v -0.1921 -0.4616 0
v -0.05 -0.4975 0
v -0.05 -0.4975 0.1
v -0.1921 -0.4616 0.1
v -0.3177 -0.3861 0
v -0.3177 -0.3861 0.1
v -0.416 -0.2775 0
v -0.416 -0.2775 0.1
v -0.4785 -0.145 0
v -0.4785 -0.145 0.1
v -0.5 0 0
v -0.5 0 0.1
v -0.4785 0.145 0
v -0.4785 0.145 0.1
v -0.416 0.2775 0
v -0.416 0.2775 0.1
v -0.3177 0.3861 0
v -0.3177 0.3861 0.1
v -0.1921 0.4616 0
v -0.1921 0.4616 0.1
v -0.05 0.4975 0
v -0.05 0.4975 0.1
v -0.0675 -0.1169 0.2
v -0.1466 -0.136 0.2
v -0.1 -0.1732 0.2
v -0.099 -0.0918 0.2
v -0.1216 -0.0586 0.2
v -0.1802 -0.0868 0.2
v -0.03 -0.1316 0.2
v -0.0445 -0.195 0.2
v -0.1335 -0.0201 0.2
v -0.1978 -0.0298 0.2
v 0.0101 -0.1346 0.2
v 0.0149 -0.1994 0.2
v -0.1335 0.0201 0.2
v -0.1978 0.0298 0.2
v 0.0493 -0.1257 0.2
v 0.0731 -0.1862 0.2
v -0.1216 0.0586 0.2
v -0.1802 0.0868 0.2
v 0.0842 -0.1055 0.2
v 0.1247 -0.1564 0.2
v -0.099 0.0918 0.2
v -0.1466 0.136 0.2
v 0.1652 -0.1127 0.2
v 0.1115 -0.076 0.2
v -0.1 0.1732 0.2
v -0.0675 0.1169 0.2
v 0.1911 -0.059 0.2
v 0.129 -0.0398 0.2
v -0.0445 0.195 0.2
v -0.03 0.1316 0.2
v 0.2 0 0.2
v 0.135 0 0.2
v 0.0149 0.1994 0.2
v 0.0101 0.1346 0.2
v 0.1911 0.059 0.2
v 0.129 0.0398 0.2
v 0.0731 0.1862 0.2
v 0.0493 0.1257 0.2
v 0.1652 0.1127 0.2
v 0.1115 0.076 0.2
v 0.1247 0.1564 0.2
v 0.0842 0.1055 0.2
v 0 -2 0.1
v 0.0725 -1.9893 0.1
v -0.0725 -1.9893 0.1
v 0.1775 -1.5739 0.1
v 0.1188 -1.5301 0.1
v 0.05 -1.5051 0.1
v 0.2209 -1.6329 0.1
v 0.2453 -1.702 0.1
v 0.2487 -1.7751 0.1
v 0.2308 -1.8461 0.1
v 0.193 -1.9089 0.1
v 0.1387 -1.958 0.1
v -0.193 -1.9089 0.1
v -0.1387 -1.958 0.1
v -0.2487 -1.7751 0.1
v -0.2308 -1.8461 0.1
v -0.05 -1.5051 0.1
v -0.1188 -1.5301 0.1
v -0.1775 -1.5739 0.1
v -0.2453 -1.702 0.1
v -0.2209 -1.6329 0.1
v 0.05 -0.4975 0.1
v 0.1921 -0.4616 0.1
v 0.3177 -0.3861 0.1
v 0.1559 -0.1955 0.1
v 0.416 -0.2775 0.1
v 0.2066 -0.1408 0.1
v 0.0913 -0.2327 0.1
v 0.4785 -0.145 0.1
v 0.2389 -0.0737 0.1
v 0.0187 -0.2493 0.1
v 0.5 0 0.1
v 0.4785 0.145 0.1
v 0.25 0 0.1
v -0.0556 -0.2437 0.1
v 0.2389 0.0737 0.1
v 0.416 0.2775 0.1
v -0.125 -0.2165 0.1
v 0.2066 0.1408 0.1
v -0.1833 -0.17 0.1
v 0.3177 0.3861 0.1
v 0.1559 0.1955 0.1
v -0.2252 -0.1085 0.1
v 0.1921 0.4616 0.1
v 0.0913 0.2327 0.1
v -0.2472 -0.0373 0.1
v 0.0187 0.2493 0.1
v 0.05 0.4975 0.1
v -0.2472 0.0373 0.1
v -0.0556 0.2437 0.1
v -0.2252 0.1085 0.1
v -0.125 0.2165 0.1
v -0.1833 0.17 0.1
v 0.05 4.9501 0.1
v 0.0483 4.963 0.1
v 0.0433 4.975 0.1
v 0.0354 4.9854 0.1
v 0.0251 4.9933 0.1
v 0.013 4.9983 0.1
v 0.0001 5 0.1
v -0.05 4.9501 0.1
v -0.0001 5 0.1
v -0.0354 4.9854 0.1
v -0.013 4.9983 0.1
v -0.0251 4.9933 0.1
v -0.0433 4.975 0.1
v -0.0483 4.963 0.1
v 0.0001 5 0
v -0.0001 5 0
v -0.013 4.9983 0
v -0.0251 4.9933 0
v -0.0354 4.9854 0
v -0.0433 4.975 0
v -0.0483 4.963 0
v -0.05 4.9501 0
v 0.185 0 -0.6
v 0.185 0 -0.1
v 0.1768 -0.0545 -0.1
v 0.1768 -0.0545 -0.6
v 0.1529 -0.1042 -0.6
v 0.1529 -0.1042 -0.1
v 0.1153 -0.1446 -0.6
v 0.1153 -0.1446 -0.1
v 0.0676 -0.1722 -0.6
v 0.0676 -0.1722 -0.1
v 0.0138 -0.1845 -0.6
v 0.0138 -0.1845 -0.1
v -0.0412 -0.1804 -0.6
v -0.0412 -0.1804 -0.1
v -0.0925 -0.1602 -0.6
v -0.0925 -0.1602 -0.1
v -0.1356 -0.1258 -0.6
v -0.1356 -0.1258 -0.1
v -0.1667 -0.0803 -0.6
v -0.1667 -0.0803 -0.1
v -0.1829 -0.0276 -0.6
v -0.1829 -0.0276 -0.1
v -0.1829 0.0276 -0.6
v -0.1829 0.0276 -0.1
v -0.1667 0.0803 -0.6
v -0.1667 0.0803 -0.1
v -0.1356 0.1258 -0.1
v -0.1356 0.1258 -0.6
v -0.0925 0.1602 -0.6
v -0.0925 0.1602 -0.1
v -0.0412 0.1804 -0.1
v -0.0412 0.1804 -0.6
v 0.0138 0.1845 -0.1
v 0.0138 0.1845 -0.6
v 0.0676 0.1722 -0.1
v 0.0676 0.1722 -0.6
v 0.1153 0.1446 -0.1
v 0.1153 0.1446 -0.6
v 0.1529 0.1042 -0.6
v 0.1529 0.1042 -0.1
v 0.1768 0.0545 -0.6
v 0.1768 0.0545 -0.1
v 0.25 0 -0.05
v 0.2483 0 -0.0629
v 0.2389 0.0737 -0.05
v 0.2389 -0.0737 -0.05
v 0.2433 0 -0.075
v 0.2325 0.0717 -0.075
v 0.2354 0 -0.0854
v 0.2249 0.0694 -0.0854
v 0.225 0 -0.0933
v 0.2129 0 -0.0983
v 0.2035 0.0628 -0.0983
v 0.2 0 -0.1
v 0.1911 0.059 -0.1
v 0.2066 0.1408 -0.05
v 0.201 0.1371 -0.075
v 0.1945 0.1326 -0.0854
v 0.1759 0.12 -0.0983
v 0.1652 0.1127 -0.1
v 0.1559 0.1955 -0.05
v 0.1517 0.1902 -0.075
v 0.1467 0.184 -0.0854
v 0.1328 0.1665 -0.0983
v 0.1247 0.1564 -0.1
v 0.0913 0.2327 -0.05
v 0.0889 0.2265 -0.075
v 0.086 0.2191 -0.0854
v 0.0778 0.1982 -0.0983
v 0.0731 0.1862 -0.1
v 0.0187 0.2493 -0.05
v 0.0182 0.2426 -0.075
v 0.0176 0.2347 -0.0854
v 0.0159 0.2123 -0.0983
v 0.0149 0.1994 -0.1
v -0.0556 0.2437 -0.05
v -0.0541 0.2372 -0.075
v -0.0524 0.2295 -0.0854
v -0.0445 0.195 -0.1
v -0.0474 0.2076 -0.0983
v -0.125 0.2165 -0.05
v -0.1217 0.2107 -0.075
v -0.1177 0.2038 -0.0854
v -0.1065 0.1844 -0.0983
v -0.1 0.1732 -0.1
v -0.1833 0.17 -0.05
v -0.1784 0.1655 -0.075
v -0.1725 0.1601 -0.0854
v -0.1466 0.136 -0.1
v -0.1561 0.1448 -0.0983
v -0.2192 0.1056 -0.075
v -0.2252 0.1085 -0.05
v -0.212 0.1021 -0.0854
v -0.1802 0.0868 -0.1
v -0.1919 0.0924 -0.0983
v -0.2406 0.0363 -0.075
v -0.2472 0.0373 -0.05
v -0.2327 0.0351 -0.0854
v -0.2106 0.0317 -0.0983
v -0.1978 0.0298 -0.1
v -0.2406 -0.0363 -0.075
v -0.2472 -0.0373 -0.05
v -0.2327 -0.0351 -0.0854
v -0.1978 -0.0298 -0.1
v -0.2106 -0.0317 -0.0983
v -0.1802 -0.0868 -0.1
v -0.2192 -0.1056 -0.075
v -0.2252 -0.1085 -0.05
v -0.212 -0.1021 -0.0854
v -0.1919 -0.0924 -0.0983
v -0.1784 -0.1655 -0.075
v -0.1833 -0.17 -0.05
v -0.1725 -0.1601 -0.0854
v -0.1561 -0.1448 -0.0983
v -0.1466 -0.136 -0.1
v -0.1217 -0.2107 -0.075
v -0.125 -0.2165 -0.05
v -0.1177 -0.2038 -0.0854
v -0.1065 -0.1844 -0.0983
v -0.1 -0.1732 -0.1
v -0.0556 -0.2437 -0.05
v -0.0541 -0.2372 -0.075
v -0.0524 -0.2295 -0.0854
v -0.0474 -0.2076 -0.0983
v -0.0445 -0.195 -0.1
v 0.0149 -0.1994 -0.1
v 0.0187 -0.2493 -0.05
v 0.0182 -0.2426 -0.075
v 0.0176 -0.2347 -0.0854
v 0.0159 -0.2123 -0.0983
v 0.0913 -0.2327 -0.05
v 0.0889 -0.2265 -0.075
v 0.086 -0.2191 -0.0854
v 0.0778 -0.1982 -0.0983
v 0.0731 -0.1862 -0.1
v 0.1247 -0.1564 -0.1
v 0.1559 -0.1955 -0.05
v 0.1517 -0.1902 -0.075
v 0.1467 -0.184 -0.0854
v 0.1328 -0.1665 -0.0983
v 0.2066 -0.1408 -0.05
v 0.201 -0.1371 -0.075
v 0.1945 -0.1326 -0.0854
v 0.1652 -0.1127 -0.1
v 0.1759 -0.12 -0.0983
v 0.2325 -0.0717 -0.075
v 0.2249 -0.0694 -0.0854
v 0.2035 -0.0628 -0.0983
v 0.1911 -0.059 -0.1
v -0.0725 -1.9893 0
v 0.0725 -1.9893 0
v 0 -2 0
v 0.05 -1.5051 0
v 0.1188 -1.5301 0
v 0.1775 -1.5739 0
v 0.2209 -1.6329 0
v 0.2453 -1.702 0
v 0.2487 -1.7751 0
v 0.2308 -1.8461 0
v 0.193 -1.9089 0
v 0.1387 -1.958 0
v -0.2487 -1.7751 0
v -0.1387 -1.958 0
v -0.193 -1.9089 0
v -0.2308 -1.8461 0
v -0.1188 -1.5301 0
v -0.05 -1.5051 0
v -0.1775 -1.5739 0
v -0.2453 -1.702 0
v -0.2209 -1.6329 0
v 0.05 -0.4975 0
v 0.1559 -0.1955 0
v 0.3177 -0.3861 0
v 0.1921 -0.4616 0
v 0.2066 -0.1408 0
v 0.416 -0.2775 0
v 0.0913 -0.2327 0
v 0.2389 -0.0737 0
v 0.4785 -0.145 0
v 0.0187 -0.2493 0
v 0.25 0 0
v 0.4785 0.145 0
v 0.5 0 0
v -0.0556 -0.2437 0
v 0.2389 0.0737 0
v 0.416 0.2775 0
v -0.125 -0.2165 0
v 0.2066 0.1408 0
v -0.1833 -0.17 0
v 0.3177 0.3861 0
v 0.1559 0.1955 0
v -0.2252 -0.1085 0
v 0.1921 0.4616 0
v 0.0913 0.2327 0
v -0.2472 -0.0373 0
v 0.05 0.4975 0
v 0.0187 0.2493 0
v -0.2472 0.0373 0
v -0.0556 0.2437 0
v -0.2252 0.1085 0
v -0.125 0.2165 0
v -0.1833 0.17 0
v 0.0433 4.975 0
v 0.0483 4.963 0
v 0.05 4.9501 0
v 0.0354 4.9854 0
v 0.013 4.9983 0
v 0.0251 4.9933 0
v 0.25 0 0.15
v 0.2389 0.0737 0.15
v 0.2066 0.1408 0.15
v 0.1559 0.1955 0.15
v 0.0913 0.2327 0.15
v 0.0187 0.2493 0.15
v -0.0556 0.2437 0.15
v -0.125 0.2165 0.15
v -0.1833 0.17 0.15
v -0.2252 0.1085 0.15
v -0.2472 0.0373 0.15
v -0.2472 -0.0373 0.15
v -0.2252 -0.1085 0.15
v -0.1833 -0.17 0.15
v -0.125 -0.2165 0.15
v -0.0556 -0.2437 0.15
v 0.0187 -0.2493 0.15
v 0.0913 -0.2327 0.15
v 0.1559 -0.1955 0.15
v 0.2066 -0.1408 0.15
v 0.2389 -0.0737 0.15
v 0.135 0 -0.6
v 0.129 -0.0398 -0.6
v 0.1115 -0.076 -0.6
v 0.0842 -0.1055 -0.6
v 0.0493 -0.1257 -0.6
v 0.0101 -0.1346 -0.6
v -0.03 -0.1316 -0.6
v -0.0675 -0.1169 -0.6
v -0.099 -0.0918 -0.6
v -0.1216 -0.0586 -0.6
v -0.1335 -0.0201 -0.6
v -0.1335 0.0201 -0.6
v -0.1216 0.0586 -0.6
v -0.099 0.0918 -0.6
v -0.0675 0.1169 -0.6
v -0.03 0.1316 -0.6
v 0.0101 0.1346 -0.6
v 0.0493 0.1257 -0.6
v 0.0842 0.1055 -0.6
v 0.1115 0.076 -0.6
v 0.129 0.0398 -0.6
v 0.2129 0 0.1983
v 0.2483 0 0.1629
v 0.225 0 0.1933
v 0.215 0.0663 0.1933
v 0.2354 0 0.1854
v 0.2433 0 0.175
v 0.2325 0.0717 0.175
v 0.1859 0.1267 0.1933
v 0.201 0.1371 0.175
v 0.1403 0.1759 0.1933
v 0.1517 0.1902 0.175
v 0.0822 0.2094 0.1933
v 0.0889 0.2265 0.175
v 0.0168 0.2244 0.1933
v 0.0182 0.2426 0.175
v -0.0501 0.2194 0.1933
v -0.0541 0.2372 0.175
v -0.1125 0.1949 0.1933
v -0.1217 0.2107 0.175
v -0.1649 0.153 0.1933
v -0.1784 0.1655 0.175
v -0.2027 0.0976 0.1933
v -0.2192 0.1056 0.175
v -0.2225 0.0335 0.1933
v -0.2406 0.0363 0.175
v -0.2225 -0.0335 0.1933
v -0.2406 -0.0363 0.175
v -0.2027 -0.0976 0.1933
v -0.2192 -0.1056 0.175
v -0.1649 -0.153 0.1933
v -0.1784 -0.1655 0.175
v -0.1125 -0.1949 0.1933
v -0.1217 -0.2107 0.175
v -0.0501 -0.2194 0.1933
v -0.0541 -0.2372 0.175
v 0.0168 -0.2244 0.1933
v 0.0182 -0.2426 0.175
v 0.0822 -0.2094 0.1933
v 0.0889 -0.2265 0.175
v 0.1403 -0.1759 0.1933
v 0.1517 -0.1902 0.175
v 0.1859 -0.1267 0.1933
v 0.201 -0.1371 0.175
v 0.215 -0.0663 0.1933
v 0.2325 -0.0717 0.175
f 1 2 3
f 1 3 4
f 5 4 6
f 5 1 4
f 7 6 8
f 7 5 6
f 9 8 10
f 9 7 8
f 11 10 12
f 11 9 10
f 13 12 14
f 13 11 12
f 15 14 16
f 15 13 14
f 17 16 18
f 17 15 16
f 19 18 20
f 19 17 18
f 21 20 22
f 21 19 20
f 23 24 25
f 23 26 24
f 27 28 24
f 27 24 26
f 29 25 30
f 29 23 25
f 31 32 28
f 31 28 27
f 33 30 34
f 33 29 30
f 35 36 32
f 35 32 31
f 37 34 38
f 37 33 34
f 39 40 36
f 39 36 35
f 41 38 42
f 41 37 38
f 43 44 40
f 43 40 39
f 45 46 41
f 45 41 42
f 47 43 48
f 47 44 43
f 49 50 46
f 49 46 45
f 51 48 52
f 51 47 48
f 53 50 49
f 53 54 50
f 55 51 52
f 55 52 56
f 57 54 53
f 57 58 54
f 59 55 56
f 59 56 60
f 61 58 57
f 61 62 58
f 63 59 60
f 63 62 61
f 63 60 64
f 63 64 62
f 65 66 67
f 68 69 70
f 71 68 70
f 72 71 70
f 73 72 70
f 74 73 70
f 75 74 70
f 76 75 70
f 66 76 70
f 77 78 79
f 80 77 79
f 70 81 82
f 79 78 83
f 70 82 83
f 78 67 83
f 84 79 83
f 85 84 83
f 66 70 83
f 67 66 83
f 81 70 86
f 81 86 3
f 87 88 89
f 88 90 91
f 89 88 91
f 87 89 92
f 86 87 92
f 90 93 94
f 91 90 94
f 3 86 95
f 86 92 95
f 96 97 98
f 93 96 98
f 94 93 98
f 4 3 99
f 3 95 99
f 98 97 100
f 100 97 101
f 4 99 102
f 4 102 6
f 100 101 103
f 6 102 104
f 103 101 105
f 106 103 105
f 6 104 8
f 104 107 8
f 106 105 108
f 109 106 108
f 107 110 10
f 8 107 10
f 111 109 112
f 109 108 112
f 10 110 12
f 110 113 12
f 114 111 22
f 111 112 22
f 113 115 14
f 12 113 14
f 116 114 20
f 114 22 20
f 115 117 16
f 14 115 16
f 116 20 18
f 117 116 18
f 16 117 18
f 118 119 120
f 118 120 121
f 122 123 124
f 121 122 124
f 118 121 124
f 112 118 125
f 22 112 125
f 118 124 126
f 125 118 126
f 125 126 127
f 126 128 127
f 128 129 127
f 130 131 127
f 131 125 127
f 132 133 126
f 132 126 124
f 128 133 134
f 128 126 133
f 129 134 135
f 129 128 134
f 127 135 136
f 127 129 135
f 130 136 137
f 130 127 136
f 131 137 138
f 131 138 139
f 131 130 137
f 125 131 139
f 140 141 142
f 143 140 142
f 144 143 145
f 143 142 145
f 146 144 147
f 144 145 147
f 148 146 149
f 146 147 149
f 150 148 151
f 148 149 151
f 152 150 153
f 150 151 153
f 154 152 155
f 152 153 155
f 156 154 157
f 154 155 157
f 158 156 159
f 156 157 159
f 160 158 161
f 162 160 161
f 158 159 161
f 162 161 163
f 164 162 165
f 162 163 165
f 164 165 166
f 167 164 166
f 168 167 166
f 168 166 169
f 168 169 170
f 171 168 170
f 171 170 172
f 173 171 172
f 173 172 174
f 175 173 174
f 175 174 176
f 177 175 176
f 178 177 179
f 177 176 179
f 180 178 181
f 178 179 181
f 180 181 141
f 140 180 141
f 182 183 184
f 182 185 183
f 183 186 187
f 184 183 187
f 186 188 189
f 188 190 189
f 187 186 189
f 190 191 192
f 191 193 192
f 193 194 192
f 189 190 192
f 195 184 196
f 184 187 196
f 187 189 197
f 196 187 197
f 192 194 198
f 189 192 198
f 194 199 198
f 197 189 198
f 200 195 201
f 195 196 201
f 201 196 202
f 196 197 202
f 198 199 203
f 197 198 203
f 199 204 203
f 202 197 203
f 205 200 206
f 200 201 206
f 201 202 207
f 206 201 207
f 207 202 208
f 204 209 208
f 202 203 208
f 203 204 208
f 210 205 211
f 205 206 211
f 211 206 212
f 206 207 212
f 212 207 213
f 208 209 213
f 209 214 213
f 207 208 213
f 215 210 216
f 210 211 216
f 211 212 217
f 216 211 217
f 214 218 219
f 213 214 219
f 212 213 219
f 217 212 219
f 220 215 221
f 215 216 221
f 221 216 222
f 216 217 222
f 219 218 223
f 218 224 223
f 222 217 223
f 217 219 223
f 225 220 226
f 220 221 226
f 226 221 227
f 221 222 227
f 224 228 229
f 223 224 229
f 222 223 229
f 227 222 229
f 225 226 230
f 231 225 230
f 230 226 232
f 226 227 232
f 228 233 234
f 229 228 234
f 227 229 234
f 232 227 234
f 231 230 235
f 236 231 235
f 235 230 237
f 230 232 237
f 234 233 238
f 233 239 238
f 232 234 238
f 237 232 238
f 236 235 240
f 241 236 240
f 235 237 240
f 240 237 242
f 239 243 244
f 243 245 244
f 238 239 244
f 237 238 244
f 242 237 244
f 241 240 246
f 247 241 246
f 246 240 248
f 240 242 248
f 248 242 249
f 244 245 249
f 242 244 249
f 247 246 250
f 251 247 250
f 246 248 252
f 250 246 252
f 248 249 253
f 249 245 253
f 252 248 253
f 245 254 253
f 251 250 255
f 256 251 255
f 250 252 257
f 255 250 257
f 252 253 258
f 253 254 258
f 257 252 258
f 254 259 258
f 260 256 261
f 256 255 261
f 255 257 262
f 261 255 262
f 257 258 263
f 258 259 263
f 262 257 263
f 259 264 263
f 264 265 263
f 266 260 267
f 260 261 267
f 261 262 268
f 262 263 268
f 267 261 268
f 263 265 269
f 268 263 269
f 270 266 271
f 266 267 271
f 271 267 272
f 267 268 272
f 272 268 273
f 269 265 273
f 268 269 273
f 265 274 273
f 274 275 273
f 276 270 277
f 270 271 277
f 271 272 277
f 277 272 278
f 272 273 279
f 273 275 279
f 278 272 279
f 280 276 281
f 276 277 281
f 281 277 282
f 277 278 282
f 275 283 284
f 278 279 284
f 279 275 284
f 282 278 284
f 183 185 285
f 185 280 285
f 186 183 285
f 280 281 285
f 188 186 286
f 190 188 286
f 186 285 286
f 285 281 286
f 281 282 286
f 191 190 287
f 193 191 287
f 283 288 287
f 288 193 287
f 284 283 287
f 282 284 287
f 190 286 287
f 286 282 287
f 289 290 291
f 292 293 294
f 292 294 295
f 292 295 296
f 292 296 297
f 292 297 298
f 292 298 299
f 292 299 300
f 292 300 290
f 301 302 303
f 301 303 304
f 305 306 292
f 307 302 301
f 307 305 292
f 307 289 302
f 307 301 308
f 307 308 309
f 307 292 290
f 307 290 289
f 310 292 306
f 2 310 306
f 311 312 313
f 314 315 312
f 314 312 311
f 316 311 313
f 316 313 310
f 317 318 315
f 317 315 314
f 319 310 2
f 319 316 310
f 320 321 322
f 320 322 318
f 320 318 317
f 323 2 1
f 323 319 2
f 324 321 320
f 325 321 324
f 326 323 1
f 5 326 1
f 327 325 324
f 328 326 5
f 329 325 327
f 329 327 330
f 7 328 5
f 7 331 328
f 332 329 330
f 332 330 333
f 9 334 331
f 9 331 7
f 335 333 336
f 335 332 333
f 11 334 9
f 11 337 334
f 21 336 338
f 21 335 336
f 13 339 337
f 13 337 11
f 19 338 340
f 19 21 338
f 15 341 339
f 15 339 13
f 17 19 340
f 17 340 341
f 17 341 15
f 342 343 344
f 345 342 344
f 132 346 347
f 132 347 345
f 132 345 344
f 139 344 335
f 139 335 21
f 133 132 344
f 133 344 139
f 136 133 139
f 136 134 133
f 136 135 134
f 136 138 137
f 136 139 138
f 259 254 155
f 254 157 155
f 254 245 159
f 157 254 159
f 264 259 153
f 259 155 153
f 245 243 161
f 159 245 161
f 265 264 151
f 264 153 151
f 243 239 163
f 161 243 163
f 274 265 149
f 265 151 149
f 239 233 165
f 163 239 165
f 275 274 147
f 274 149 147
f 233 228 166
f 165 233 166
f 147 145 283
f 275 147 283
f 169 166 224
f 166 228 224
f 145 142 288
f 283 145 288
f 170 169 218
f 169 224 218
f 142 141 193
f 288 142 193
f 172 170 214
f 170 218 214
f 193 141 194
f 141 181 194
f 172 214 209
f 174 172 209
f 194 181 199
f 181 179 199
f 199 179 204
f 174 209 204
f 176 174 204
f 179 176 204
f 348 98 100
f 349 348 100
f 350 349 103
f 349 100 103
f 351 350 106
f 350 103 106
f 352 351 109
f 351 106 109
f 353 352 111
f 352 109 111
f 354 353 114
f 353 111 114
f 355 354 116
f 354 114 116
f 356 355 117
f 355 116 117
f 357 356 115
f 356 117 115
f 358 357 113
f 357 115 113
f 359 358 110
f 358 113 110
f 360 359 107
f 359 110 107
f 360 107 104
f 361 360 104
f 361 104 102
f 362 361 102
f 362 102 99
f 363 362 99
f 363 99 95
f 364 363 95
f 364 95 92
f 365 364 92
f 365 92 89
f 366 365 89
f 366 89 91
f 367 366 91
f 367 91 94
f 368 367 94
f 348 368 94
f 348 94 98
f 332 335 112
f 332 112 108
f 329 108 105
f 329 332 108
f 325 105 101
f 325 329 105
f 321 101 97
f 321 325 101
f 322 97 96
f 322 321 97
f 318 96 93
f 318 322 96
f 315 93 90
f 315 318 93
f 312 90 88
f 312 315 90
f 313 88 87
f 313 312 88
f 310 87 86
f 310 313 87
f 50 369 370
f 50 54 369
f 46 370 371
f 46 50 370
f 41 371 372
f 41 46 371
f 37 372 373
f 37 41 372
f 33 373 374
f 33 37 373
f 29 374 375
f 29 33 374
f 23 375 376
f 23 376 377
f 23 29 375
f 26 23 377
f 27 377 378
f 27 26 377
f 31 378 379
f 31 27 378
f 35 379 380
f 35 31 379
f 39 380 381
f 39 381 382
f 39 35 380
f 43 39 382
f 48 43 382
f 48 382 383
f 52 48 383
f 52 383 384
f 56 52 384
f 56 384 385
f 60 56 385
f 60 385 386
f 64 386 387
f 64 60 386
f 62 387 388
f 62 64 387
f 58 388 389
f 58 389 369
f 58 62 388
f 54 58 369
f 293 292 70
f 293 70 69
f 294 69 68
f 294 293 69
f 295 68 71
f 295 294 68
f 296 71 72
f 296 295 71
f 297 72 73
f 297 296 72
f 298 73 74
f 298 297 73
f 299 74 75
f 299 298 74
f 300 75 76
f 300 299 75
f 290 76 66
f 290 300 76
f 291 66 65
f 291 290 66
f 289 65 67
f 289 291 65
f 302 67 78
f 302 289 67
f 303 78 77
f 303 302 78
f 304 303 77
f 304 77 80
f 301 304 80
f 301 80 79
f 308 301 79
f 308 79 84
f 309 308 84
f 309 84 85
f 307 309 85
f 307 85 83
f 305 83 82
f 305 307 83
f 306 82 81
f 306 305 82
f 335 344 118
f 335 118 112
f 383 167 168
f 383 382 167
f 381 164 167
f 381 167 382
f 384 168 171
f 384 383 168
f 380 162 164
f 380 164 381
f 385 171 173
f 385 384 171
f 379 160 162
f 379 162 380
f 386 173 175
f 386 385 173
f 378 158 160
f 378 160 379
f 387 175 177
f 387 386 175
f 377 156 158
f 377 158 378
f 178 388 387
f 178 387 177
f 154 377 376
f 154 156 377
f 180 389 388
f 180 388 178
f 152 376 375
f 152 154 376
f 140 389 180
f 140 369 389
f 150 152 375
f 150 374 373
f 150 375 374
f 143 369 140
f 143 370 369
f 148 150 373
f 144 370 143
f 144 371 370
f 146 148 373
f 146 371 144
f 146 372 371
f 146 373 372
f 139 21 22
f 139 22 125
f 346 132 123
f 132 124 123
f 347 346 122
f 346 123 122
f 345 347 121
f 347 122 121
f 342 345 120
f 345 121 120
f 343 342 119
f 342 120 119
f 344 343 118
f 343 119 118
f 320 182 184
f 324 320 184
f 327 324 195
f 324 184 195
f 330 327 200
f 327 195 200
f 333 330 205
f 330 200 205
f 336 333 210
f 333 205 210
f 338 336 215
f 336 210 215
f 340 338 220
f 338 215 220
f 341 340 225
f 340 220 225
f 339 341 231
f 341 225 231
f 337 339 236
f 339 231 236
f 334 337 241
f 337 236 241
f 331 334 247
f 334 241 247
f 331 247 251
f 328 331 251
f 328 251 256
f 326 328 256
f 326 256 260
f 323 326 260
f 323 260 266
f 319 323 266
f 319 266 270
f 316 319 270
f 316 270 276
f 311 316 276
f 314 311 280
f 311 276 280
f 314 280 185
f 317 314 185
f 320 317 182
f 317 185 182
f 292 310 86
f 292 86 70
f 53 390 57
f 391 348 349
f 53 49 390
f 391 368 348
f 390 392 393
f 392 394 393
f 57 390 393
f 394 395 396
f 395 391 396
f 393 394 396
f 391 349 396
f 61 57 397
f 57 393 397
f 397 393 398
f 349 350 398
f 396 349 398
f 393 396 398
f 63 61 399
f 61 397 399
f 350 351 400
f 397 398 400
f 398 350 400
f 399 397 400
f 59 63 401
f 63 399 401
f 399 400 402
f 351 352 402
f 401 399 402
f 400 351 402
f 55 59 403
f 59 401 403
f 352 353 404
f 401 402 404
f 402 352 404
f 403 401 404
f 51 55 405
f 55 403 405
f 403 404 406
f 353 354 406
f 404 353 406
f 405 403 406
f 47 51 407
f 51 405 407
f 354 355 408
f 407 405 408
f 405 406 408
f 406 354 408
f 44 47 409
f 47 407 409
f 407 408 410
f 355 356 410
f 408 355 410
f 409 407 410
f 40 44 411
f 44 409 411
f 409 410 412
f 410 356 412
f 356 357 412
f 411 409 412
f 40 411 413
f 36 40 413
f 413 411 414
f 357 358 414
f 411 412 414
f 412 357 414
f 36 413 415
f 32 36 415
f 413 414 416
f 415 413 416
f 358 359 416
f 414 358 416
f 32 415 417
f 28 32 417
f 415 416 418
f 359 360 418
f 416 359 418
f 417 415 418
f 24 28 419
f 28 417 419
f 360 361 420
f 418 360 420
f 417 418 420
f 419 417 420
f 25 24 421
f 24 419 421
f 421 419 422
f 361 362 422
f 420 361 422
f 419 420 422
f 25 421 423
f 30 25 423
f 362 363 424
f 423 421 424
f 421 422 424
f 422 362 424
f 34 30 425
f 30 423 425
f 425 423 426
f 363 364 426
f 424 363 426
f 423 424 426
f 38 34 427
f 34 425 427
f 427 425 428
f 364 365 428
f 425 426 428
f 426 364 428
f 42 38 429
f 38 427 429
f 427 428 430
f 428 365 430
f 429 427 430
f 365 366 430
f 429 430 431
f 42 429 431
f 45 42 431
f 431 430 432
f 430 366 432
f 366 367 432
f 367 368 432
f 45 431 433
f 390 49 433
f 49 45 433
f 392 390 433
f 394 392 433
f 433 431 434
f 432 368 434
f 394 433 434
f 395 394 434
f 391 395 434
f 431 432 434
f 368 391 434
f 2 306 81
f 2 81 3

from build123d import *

# Parameters (mm, degrees)
BOSS_EXTRUDE1_DEPTH      = 0.1
FILLET1_R                = 0.05
BOSS_EXTRUDE2_DEPTH      = 0.2
BOSS_EXTRUDE2_DEPTH_BACK = 0.1
SKETCH2_R                = 0.25
CUT_EXTRUDE2_DEPTH       = 6.028916384
CUT_EXTRUDE2_DEPTH_BACK  = 6.028916384
SKETCH3_R                = 0.135
FILLET2_R                = 0.05
SKETCH4_R                = 0.185
SKETCH4_R_2              = 0.135
BOSS_EXTRUDE3_DEPTH      = 0.5


with BuildPart() as part:
    # Sketch1 → Boss-Extrude1 (new body)
    with BuildSketch(Plane.XY):
        with BuildLine():
            Line((-0.05, 5), (0.05, 5))
            Line((0.05, 5), (0.05, 0.497493719))
            ThreePointArc((0.05, 0.497493719), (0.5, 0), (0.05, -0.497493719))
            Line((0.05, -0.497493719), (0.05, -1.505051026))
            ThreePointArc((0.05, -1.505051026), (0, -2), (-0.05, -1.505051026))
            Line((-0.05, -1.505051026), (-0.05, -0.497493719))
            ThreePointArc((-0.05, -0.497493719), (-0.5, 0), (-0.05, 0.497493719))
            Line((-0.05, 0.497493719), (-0.05, 5))
        make_face()
    extrude(amount=BOSS_EXTRUDE1_DEPTH)

    # Fillet1
    fillet1_edges = [part.edges().sort_by_distance(p)[0] for p in [
        (-0.05, 5, 0.05),
        (0.05, 5, 0.05),
    ]]
    fillet(fillet1_edges, radius=FILLET1_R - 0.0001)  # a hair under: the kernel refuses the full size

    # Sketch2 → Boss-Extrude2 (add, two sides: drawn at the far end of the back side and taken through both)
    with BuildSketch(Plane.XY.offset(-BOSS_EXTRUDE2_DEPTH_BACK)):
        Circle(SKETCH2_R)
    extrude(amount=BOSS_EXTRUDE2_DEPTH + BOSS_EXTRUDE2_DEPTH_BACK)

    # Sketch3 → Cut-Extrude2 (cut, two sides: drawn at the far end of the back side and taken through both)
    with BuildSketch(Plane.XY.offset(-CUT_EXTRUDE2_DEPTH_BACK)):
        Circle(SKETCH3_R)
    extrude(amount=CUT_EXTRUDE2_DEPTH + CUT_EXTRUDE2_DEPTH_BACK, mode=Mode.SUBTRACT)

    # Fillet2
    fillet2_edges = [part.edges().sort_by_distance(p)[0] for p in [
        (-0.25, 0, -0.1),
        (-0.25, 0, 0.2),
    ]]
    fillet(fillet2_edges, radius=FILLET2_R)

    # Sketch4 → Boss-Extrude3 (add)
    with BuildSketch(Plane(origin=(0, 0, -0.1), x_dir=(-1, 0, 0), z_dir=(0, 0, -1))):
        with Locations(Location((0, 0, 0), (0, 0, 180))):
            Circle(SKETCH4_R)
        with Locations(Location((0, 0, 0), (0, 0, 180))):
            Circle(SKETCH4_R_2, mode=Mode.SUBTRACT)
    extrude(amount=BOSS_EXTRUDE3_DEPTH)


solid = part.part
